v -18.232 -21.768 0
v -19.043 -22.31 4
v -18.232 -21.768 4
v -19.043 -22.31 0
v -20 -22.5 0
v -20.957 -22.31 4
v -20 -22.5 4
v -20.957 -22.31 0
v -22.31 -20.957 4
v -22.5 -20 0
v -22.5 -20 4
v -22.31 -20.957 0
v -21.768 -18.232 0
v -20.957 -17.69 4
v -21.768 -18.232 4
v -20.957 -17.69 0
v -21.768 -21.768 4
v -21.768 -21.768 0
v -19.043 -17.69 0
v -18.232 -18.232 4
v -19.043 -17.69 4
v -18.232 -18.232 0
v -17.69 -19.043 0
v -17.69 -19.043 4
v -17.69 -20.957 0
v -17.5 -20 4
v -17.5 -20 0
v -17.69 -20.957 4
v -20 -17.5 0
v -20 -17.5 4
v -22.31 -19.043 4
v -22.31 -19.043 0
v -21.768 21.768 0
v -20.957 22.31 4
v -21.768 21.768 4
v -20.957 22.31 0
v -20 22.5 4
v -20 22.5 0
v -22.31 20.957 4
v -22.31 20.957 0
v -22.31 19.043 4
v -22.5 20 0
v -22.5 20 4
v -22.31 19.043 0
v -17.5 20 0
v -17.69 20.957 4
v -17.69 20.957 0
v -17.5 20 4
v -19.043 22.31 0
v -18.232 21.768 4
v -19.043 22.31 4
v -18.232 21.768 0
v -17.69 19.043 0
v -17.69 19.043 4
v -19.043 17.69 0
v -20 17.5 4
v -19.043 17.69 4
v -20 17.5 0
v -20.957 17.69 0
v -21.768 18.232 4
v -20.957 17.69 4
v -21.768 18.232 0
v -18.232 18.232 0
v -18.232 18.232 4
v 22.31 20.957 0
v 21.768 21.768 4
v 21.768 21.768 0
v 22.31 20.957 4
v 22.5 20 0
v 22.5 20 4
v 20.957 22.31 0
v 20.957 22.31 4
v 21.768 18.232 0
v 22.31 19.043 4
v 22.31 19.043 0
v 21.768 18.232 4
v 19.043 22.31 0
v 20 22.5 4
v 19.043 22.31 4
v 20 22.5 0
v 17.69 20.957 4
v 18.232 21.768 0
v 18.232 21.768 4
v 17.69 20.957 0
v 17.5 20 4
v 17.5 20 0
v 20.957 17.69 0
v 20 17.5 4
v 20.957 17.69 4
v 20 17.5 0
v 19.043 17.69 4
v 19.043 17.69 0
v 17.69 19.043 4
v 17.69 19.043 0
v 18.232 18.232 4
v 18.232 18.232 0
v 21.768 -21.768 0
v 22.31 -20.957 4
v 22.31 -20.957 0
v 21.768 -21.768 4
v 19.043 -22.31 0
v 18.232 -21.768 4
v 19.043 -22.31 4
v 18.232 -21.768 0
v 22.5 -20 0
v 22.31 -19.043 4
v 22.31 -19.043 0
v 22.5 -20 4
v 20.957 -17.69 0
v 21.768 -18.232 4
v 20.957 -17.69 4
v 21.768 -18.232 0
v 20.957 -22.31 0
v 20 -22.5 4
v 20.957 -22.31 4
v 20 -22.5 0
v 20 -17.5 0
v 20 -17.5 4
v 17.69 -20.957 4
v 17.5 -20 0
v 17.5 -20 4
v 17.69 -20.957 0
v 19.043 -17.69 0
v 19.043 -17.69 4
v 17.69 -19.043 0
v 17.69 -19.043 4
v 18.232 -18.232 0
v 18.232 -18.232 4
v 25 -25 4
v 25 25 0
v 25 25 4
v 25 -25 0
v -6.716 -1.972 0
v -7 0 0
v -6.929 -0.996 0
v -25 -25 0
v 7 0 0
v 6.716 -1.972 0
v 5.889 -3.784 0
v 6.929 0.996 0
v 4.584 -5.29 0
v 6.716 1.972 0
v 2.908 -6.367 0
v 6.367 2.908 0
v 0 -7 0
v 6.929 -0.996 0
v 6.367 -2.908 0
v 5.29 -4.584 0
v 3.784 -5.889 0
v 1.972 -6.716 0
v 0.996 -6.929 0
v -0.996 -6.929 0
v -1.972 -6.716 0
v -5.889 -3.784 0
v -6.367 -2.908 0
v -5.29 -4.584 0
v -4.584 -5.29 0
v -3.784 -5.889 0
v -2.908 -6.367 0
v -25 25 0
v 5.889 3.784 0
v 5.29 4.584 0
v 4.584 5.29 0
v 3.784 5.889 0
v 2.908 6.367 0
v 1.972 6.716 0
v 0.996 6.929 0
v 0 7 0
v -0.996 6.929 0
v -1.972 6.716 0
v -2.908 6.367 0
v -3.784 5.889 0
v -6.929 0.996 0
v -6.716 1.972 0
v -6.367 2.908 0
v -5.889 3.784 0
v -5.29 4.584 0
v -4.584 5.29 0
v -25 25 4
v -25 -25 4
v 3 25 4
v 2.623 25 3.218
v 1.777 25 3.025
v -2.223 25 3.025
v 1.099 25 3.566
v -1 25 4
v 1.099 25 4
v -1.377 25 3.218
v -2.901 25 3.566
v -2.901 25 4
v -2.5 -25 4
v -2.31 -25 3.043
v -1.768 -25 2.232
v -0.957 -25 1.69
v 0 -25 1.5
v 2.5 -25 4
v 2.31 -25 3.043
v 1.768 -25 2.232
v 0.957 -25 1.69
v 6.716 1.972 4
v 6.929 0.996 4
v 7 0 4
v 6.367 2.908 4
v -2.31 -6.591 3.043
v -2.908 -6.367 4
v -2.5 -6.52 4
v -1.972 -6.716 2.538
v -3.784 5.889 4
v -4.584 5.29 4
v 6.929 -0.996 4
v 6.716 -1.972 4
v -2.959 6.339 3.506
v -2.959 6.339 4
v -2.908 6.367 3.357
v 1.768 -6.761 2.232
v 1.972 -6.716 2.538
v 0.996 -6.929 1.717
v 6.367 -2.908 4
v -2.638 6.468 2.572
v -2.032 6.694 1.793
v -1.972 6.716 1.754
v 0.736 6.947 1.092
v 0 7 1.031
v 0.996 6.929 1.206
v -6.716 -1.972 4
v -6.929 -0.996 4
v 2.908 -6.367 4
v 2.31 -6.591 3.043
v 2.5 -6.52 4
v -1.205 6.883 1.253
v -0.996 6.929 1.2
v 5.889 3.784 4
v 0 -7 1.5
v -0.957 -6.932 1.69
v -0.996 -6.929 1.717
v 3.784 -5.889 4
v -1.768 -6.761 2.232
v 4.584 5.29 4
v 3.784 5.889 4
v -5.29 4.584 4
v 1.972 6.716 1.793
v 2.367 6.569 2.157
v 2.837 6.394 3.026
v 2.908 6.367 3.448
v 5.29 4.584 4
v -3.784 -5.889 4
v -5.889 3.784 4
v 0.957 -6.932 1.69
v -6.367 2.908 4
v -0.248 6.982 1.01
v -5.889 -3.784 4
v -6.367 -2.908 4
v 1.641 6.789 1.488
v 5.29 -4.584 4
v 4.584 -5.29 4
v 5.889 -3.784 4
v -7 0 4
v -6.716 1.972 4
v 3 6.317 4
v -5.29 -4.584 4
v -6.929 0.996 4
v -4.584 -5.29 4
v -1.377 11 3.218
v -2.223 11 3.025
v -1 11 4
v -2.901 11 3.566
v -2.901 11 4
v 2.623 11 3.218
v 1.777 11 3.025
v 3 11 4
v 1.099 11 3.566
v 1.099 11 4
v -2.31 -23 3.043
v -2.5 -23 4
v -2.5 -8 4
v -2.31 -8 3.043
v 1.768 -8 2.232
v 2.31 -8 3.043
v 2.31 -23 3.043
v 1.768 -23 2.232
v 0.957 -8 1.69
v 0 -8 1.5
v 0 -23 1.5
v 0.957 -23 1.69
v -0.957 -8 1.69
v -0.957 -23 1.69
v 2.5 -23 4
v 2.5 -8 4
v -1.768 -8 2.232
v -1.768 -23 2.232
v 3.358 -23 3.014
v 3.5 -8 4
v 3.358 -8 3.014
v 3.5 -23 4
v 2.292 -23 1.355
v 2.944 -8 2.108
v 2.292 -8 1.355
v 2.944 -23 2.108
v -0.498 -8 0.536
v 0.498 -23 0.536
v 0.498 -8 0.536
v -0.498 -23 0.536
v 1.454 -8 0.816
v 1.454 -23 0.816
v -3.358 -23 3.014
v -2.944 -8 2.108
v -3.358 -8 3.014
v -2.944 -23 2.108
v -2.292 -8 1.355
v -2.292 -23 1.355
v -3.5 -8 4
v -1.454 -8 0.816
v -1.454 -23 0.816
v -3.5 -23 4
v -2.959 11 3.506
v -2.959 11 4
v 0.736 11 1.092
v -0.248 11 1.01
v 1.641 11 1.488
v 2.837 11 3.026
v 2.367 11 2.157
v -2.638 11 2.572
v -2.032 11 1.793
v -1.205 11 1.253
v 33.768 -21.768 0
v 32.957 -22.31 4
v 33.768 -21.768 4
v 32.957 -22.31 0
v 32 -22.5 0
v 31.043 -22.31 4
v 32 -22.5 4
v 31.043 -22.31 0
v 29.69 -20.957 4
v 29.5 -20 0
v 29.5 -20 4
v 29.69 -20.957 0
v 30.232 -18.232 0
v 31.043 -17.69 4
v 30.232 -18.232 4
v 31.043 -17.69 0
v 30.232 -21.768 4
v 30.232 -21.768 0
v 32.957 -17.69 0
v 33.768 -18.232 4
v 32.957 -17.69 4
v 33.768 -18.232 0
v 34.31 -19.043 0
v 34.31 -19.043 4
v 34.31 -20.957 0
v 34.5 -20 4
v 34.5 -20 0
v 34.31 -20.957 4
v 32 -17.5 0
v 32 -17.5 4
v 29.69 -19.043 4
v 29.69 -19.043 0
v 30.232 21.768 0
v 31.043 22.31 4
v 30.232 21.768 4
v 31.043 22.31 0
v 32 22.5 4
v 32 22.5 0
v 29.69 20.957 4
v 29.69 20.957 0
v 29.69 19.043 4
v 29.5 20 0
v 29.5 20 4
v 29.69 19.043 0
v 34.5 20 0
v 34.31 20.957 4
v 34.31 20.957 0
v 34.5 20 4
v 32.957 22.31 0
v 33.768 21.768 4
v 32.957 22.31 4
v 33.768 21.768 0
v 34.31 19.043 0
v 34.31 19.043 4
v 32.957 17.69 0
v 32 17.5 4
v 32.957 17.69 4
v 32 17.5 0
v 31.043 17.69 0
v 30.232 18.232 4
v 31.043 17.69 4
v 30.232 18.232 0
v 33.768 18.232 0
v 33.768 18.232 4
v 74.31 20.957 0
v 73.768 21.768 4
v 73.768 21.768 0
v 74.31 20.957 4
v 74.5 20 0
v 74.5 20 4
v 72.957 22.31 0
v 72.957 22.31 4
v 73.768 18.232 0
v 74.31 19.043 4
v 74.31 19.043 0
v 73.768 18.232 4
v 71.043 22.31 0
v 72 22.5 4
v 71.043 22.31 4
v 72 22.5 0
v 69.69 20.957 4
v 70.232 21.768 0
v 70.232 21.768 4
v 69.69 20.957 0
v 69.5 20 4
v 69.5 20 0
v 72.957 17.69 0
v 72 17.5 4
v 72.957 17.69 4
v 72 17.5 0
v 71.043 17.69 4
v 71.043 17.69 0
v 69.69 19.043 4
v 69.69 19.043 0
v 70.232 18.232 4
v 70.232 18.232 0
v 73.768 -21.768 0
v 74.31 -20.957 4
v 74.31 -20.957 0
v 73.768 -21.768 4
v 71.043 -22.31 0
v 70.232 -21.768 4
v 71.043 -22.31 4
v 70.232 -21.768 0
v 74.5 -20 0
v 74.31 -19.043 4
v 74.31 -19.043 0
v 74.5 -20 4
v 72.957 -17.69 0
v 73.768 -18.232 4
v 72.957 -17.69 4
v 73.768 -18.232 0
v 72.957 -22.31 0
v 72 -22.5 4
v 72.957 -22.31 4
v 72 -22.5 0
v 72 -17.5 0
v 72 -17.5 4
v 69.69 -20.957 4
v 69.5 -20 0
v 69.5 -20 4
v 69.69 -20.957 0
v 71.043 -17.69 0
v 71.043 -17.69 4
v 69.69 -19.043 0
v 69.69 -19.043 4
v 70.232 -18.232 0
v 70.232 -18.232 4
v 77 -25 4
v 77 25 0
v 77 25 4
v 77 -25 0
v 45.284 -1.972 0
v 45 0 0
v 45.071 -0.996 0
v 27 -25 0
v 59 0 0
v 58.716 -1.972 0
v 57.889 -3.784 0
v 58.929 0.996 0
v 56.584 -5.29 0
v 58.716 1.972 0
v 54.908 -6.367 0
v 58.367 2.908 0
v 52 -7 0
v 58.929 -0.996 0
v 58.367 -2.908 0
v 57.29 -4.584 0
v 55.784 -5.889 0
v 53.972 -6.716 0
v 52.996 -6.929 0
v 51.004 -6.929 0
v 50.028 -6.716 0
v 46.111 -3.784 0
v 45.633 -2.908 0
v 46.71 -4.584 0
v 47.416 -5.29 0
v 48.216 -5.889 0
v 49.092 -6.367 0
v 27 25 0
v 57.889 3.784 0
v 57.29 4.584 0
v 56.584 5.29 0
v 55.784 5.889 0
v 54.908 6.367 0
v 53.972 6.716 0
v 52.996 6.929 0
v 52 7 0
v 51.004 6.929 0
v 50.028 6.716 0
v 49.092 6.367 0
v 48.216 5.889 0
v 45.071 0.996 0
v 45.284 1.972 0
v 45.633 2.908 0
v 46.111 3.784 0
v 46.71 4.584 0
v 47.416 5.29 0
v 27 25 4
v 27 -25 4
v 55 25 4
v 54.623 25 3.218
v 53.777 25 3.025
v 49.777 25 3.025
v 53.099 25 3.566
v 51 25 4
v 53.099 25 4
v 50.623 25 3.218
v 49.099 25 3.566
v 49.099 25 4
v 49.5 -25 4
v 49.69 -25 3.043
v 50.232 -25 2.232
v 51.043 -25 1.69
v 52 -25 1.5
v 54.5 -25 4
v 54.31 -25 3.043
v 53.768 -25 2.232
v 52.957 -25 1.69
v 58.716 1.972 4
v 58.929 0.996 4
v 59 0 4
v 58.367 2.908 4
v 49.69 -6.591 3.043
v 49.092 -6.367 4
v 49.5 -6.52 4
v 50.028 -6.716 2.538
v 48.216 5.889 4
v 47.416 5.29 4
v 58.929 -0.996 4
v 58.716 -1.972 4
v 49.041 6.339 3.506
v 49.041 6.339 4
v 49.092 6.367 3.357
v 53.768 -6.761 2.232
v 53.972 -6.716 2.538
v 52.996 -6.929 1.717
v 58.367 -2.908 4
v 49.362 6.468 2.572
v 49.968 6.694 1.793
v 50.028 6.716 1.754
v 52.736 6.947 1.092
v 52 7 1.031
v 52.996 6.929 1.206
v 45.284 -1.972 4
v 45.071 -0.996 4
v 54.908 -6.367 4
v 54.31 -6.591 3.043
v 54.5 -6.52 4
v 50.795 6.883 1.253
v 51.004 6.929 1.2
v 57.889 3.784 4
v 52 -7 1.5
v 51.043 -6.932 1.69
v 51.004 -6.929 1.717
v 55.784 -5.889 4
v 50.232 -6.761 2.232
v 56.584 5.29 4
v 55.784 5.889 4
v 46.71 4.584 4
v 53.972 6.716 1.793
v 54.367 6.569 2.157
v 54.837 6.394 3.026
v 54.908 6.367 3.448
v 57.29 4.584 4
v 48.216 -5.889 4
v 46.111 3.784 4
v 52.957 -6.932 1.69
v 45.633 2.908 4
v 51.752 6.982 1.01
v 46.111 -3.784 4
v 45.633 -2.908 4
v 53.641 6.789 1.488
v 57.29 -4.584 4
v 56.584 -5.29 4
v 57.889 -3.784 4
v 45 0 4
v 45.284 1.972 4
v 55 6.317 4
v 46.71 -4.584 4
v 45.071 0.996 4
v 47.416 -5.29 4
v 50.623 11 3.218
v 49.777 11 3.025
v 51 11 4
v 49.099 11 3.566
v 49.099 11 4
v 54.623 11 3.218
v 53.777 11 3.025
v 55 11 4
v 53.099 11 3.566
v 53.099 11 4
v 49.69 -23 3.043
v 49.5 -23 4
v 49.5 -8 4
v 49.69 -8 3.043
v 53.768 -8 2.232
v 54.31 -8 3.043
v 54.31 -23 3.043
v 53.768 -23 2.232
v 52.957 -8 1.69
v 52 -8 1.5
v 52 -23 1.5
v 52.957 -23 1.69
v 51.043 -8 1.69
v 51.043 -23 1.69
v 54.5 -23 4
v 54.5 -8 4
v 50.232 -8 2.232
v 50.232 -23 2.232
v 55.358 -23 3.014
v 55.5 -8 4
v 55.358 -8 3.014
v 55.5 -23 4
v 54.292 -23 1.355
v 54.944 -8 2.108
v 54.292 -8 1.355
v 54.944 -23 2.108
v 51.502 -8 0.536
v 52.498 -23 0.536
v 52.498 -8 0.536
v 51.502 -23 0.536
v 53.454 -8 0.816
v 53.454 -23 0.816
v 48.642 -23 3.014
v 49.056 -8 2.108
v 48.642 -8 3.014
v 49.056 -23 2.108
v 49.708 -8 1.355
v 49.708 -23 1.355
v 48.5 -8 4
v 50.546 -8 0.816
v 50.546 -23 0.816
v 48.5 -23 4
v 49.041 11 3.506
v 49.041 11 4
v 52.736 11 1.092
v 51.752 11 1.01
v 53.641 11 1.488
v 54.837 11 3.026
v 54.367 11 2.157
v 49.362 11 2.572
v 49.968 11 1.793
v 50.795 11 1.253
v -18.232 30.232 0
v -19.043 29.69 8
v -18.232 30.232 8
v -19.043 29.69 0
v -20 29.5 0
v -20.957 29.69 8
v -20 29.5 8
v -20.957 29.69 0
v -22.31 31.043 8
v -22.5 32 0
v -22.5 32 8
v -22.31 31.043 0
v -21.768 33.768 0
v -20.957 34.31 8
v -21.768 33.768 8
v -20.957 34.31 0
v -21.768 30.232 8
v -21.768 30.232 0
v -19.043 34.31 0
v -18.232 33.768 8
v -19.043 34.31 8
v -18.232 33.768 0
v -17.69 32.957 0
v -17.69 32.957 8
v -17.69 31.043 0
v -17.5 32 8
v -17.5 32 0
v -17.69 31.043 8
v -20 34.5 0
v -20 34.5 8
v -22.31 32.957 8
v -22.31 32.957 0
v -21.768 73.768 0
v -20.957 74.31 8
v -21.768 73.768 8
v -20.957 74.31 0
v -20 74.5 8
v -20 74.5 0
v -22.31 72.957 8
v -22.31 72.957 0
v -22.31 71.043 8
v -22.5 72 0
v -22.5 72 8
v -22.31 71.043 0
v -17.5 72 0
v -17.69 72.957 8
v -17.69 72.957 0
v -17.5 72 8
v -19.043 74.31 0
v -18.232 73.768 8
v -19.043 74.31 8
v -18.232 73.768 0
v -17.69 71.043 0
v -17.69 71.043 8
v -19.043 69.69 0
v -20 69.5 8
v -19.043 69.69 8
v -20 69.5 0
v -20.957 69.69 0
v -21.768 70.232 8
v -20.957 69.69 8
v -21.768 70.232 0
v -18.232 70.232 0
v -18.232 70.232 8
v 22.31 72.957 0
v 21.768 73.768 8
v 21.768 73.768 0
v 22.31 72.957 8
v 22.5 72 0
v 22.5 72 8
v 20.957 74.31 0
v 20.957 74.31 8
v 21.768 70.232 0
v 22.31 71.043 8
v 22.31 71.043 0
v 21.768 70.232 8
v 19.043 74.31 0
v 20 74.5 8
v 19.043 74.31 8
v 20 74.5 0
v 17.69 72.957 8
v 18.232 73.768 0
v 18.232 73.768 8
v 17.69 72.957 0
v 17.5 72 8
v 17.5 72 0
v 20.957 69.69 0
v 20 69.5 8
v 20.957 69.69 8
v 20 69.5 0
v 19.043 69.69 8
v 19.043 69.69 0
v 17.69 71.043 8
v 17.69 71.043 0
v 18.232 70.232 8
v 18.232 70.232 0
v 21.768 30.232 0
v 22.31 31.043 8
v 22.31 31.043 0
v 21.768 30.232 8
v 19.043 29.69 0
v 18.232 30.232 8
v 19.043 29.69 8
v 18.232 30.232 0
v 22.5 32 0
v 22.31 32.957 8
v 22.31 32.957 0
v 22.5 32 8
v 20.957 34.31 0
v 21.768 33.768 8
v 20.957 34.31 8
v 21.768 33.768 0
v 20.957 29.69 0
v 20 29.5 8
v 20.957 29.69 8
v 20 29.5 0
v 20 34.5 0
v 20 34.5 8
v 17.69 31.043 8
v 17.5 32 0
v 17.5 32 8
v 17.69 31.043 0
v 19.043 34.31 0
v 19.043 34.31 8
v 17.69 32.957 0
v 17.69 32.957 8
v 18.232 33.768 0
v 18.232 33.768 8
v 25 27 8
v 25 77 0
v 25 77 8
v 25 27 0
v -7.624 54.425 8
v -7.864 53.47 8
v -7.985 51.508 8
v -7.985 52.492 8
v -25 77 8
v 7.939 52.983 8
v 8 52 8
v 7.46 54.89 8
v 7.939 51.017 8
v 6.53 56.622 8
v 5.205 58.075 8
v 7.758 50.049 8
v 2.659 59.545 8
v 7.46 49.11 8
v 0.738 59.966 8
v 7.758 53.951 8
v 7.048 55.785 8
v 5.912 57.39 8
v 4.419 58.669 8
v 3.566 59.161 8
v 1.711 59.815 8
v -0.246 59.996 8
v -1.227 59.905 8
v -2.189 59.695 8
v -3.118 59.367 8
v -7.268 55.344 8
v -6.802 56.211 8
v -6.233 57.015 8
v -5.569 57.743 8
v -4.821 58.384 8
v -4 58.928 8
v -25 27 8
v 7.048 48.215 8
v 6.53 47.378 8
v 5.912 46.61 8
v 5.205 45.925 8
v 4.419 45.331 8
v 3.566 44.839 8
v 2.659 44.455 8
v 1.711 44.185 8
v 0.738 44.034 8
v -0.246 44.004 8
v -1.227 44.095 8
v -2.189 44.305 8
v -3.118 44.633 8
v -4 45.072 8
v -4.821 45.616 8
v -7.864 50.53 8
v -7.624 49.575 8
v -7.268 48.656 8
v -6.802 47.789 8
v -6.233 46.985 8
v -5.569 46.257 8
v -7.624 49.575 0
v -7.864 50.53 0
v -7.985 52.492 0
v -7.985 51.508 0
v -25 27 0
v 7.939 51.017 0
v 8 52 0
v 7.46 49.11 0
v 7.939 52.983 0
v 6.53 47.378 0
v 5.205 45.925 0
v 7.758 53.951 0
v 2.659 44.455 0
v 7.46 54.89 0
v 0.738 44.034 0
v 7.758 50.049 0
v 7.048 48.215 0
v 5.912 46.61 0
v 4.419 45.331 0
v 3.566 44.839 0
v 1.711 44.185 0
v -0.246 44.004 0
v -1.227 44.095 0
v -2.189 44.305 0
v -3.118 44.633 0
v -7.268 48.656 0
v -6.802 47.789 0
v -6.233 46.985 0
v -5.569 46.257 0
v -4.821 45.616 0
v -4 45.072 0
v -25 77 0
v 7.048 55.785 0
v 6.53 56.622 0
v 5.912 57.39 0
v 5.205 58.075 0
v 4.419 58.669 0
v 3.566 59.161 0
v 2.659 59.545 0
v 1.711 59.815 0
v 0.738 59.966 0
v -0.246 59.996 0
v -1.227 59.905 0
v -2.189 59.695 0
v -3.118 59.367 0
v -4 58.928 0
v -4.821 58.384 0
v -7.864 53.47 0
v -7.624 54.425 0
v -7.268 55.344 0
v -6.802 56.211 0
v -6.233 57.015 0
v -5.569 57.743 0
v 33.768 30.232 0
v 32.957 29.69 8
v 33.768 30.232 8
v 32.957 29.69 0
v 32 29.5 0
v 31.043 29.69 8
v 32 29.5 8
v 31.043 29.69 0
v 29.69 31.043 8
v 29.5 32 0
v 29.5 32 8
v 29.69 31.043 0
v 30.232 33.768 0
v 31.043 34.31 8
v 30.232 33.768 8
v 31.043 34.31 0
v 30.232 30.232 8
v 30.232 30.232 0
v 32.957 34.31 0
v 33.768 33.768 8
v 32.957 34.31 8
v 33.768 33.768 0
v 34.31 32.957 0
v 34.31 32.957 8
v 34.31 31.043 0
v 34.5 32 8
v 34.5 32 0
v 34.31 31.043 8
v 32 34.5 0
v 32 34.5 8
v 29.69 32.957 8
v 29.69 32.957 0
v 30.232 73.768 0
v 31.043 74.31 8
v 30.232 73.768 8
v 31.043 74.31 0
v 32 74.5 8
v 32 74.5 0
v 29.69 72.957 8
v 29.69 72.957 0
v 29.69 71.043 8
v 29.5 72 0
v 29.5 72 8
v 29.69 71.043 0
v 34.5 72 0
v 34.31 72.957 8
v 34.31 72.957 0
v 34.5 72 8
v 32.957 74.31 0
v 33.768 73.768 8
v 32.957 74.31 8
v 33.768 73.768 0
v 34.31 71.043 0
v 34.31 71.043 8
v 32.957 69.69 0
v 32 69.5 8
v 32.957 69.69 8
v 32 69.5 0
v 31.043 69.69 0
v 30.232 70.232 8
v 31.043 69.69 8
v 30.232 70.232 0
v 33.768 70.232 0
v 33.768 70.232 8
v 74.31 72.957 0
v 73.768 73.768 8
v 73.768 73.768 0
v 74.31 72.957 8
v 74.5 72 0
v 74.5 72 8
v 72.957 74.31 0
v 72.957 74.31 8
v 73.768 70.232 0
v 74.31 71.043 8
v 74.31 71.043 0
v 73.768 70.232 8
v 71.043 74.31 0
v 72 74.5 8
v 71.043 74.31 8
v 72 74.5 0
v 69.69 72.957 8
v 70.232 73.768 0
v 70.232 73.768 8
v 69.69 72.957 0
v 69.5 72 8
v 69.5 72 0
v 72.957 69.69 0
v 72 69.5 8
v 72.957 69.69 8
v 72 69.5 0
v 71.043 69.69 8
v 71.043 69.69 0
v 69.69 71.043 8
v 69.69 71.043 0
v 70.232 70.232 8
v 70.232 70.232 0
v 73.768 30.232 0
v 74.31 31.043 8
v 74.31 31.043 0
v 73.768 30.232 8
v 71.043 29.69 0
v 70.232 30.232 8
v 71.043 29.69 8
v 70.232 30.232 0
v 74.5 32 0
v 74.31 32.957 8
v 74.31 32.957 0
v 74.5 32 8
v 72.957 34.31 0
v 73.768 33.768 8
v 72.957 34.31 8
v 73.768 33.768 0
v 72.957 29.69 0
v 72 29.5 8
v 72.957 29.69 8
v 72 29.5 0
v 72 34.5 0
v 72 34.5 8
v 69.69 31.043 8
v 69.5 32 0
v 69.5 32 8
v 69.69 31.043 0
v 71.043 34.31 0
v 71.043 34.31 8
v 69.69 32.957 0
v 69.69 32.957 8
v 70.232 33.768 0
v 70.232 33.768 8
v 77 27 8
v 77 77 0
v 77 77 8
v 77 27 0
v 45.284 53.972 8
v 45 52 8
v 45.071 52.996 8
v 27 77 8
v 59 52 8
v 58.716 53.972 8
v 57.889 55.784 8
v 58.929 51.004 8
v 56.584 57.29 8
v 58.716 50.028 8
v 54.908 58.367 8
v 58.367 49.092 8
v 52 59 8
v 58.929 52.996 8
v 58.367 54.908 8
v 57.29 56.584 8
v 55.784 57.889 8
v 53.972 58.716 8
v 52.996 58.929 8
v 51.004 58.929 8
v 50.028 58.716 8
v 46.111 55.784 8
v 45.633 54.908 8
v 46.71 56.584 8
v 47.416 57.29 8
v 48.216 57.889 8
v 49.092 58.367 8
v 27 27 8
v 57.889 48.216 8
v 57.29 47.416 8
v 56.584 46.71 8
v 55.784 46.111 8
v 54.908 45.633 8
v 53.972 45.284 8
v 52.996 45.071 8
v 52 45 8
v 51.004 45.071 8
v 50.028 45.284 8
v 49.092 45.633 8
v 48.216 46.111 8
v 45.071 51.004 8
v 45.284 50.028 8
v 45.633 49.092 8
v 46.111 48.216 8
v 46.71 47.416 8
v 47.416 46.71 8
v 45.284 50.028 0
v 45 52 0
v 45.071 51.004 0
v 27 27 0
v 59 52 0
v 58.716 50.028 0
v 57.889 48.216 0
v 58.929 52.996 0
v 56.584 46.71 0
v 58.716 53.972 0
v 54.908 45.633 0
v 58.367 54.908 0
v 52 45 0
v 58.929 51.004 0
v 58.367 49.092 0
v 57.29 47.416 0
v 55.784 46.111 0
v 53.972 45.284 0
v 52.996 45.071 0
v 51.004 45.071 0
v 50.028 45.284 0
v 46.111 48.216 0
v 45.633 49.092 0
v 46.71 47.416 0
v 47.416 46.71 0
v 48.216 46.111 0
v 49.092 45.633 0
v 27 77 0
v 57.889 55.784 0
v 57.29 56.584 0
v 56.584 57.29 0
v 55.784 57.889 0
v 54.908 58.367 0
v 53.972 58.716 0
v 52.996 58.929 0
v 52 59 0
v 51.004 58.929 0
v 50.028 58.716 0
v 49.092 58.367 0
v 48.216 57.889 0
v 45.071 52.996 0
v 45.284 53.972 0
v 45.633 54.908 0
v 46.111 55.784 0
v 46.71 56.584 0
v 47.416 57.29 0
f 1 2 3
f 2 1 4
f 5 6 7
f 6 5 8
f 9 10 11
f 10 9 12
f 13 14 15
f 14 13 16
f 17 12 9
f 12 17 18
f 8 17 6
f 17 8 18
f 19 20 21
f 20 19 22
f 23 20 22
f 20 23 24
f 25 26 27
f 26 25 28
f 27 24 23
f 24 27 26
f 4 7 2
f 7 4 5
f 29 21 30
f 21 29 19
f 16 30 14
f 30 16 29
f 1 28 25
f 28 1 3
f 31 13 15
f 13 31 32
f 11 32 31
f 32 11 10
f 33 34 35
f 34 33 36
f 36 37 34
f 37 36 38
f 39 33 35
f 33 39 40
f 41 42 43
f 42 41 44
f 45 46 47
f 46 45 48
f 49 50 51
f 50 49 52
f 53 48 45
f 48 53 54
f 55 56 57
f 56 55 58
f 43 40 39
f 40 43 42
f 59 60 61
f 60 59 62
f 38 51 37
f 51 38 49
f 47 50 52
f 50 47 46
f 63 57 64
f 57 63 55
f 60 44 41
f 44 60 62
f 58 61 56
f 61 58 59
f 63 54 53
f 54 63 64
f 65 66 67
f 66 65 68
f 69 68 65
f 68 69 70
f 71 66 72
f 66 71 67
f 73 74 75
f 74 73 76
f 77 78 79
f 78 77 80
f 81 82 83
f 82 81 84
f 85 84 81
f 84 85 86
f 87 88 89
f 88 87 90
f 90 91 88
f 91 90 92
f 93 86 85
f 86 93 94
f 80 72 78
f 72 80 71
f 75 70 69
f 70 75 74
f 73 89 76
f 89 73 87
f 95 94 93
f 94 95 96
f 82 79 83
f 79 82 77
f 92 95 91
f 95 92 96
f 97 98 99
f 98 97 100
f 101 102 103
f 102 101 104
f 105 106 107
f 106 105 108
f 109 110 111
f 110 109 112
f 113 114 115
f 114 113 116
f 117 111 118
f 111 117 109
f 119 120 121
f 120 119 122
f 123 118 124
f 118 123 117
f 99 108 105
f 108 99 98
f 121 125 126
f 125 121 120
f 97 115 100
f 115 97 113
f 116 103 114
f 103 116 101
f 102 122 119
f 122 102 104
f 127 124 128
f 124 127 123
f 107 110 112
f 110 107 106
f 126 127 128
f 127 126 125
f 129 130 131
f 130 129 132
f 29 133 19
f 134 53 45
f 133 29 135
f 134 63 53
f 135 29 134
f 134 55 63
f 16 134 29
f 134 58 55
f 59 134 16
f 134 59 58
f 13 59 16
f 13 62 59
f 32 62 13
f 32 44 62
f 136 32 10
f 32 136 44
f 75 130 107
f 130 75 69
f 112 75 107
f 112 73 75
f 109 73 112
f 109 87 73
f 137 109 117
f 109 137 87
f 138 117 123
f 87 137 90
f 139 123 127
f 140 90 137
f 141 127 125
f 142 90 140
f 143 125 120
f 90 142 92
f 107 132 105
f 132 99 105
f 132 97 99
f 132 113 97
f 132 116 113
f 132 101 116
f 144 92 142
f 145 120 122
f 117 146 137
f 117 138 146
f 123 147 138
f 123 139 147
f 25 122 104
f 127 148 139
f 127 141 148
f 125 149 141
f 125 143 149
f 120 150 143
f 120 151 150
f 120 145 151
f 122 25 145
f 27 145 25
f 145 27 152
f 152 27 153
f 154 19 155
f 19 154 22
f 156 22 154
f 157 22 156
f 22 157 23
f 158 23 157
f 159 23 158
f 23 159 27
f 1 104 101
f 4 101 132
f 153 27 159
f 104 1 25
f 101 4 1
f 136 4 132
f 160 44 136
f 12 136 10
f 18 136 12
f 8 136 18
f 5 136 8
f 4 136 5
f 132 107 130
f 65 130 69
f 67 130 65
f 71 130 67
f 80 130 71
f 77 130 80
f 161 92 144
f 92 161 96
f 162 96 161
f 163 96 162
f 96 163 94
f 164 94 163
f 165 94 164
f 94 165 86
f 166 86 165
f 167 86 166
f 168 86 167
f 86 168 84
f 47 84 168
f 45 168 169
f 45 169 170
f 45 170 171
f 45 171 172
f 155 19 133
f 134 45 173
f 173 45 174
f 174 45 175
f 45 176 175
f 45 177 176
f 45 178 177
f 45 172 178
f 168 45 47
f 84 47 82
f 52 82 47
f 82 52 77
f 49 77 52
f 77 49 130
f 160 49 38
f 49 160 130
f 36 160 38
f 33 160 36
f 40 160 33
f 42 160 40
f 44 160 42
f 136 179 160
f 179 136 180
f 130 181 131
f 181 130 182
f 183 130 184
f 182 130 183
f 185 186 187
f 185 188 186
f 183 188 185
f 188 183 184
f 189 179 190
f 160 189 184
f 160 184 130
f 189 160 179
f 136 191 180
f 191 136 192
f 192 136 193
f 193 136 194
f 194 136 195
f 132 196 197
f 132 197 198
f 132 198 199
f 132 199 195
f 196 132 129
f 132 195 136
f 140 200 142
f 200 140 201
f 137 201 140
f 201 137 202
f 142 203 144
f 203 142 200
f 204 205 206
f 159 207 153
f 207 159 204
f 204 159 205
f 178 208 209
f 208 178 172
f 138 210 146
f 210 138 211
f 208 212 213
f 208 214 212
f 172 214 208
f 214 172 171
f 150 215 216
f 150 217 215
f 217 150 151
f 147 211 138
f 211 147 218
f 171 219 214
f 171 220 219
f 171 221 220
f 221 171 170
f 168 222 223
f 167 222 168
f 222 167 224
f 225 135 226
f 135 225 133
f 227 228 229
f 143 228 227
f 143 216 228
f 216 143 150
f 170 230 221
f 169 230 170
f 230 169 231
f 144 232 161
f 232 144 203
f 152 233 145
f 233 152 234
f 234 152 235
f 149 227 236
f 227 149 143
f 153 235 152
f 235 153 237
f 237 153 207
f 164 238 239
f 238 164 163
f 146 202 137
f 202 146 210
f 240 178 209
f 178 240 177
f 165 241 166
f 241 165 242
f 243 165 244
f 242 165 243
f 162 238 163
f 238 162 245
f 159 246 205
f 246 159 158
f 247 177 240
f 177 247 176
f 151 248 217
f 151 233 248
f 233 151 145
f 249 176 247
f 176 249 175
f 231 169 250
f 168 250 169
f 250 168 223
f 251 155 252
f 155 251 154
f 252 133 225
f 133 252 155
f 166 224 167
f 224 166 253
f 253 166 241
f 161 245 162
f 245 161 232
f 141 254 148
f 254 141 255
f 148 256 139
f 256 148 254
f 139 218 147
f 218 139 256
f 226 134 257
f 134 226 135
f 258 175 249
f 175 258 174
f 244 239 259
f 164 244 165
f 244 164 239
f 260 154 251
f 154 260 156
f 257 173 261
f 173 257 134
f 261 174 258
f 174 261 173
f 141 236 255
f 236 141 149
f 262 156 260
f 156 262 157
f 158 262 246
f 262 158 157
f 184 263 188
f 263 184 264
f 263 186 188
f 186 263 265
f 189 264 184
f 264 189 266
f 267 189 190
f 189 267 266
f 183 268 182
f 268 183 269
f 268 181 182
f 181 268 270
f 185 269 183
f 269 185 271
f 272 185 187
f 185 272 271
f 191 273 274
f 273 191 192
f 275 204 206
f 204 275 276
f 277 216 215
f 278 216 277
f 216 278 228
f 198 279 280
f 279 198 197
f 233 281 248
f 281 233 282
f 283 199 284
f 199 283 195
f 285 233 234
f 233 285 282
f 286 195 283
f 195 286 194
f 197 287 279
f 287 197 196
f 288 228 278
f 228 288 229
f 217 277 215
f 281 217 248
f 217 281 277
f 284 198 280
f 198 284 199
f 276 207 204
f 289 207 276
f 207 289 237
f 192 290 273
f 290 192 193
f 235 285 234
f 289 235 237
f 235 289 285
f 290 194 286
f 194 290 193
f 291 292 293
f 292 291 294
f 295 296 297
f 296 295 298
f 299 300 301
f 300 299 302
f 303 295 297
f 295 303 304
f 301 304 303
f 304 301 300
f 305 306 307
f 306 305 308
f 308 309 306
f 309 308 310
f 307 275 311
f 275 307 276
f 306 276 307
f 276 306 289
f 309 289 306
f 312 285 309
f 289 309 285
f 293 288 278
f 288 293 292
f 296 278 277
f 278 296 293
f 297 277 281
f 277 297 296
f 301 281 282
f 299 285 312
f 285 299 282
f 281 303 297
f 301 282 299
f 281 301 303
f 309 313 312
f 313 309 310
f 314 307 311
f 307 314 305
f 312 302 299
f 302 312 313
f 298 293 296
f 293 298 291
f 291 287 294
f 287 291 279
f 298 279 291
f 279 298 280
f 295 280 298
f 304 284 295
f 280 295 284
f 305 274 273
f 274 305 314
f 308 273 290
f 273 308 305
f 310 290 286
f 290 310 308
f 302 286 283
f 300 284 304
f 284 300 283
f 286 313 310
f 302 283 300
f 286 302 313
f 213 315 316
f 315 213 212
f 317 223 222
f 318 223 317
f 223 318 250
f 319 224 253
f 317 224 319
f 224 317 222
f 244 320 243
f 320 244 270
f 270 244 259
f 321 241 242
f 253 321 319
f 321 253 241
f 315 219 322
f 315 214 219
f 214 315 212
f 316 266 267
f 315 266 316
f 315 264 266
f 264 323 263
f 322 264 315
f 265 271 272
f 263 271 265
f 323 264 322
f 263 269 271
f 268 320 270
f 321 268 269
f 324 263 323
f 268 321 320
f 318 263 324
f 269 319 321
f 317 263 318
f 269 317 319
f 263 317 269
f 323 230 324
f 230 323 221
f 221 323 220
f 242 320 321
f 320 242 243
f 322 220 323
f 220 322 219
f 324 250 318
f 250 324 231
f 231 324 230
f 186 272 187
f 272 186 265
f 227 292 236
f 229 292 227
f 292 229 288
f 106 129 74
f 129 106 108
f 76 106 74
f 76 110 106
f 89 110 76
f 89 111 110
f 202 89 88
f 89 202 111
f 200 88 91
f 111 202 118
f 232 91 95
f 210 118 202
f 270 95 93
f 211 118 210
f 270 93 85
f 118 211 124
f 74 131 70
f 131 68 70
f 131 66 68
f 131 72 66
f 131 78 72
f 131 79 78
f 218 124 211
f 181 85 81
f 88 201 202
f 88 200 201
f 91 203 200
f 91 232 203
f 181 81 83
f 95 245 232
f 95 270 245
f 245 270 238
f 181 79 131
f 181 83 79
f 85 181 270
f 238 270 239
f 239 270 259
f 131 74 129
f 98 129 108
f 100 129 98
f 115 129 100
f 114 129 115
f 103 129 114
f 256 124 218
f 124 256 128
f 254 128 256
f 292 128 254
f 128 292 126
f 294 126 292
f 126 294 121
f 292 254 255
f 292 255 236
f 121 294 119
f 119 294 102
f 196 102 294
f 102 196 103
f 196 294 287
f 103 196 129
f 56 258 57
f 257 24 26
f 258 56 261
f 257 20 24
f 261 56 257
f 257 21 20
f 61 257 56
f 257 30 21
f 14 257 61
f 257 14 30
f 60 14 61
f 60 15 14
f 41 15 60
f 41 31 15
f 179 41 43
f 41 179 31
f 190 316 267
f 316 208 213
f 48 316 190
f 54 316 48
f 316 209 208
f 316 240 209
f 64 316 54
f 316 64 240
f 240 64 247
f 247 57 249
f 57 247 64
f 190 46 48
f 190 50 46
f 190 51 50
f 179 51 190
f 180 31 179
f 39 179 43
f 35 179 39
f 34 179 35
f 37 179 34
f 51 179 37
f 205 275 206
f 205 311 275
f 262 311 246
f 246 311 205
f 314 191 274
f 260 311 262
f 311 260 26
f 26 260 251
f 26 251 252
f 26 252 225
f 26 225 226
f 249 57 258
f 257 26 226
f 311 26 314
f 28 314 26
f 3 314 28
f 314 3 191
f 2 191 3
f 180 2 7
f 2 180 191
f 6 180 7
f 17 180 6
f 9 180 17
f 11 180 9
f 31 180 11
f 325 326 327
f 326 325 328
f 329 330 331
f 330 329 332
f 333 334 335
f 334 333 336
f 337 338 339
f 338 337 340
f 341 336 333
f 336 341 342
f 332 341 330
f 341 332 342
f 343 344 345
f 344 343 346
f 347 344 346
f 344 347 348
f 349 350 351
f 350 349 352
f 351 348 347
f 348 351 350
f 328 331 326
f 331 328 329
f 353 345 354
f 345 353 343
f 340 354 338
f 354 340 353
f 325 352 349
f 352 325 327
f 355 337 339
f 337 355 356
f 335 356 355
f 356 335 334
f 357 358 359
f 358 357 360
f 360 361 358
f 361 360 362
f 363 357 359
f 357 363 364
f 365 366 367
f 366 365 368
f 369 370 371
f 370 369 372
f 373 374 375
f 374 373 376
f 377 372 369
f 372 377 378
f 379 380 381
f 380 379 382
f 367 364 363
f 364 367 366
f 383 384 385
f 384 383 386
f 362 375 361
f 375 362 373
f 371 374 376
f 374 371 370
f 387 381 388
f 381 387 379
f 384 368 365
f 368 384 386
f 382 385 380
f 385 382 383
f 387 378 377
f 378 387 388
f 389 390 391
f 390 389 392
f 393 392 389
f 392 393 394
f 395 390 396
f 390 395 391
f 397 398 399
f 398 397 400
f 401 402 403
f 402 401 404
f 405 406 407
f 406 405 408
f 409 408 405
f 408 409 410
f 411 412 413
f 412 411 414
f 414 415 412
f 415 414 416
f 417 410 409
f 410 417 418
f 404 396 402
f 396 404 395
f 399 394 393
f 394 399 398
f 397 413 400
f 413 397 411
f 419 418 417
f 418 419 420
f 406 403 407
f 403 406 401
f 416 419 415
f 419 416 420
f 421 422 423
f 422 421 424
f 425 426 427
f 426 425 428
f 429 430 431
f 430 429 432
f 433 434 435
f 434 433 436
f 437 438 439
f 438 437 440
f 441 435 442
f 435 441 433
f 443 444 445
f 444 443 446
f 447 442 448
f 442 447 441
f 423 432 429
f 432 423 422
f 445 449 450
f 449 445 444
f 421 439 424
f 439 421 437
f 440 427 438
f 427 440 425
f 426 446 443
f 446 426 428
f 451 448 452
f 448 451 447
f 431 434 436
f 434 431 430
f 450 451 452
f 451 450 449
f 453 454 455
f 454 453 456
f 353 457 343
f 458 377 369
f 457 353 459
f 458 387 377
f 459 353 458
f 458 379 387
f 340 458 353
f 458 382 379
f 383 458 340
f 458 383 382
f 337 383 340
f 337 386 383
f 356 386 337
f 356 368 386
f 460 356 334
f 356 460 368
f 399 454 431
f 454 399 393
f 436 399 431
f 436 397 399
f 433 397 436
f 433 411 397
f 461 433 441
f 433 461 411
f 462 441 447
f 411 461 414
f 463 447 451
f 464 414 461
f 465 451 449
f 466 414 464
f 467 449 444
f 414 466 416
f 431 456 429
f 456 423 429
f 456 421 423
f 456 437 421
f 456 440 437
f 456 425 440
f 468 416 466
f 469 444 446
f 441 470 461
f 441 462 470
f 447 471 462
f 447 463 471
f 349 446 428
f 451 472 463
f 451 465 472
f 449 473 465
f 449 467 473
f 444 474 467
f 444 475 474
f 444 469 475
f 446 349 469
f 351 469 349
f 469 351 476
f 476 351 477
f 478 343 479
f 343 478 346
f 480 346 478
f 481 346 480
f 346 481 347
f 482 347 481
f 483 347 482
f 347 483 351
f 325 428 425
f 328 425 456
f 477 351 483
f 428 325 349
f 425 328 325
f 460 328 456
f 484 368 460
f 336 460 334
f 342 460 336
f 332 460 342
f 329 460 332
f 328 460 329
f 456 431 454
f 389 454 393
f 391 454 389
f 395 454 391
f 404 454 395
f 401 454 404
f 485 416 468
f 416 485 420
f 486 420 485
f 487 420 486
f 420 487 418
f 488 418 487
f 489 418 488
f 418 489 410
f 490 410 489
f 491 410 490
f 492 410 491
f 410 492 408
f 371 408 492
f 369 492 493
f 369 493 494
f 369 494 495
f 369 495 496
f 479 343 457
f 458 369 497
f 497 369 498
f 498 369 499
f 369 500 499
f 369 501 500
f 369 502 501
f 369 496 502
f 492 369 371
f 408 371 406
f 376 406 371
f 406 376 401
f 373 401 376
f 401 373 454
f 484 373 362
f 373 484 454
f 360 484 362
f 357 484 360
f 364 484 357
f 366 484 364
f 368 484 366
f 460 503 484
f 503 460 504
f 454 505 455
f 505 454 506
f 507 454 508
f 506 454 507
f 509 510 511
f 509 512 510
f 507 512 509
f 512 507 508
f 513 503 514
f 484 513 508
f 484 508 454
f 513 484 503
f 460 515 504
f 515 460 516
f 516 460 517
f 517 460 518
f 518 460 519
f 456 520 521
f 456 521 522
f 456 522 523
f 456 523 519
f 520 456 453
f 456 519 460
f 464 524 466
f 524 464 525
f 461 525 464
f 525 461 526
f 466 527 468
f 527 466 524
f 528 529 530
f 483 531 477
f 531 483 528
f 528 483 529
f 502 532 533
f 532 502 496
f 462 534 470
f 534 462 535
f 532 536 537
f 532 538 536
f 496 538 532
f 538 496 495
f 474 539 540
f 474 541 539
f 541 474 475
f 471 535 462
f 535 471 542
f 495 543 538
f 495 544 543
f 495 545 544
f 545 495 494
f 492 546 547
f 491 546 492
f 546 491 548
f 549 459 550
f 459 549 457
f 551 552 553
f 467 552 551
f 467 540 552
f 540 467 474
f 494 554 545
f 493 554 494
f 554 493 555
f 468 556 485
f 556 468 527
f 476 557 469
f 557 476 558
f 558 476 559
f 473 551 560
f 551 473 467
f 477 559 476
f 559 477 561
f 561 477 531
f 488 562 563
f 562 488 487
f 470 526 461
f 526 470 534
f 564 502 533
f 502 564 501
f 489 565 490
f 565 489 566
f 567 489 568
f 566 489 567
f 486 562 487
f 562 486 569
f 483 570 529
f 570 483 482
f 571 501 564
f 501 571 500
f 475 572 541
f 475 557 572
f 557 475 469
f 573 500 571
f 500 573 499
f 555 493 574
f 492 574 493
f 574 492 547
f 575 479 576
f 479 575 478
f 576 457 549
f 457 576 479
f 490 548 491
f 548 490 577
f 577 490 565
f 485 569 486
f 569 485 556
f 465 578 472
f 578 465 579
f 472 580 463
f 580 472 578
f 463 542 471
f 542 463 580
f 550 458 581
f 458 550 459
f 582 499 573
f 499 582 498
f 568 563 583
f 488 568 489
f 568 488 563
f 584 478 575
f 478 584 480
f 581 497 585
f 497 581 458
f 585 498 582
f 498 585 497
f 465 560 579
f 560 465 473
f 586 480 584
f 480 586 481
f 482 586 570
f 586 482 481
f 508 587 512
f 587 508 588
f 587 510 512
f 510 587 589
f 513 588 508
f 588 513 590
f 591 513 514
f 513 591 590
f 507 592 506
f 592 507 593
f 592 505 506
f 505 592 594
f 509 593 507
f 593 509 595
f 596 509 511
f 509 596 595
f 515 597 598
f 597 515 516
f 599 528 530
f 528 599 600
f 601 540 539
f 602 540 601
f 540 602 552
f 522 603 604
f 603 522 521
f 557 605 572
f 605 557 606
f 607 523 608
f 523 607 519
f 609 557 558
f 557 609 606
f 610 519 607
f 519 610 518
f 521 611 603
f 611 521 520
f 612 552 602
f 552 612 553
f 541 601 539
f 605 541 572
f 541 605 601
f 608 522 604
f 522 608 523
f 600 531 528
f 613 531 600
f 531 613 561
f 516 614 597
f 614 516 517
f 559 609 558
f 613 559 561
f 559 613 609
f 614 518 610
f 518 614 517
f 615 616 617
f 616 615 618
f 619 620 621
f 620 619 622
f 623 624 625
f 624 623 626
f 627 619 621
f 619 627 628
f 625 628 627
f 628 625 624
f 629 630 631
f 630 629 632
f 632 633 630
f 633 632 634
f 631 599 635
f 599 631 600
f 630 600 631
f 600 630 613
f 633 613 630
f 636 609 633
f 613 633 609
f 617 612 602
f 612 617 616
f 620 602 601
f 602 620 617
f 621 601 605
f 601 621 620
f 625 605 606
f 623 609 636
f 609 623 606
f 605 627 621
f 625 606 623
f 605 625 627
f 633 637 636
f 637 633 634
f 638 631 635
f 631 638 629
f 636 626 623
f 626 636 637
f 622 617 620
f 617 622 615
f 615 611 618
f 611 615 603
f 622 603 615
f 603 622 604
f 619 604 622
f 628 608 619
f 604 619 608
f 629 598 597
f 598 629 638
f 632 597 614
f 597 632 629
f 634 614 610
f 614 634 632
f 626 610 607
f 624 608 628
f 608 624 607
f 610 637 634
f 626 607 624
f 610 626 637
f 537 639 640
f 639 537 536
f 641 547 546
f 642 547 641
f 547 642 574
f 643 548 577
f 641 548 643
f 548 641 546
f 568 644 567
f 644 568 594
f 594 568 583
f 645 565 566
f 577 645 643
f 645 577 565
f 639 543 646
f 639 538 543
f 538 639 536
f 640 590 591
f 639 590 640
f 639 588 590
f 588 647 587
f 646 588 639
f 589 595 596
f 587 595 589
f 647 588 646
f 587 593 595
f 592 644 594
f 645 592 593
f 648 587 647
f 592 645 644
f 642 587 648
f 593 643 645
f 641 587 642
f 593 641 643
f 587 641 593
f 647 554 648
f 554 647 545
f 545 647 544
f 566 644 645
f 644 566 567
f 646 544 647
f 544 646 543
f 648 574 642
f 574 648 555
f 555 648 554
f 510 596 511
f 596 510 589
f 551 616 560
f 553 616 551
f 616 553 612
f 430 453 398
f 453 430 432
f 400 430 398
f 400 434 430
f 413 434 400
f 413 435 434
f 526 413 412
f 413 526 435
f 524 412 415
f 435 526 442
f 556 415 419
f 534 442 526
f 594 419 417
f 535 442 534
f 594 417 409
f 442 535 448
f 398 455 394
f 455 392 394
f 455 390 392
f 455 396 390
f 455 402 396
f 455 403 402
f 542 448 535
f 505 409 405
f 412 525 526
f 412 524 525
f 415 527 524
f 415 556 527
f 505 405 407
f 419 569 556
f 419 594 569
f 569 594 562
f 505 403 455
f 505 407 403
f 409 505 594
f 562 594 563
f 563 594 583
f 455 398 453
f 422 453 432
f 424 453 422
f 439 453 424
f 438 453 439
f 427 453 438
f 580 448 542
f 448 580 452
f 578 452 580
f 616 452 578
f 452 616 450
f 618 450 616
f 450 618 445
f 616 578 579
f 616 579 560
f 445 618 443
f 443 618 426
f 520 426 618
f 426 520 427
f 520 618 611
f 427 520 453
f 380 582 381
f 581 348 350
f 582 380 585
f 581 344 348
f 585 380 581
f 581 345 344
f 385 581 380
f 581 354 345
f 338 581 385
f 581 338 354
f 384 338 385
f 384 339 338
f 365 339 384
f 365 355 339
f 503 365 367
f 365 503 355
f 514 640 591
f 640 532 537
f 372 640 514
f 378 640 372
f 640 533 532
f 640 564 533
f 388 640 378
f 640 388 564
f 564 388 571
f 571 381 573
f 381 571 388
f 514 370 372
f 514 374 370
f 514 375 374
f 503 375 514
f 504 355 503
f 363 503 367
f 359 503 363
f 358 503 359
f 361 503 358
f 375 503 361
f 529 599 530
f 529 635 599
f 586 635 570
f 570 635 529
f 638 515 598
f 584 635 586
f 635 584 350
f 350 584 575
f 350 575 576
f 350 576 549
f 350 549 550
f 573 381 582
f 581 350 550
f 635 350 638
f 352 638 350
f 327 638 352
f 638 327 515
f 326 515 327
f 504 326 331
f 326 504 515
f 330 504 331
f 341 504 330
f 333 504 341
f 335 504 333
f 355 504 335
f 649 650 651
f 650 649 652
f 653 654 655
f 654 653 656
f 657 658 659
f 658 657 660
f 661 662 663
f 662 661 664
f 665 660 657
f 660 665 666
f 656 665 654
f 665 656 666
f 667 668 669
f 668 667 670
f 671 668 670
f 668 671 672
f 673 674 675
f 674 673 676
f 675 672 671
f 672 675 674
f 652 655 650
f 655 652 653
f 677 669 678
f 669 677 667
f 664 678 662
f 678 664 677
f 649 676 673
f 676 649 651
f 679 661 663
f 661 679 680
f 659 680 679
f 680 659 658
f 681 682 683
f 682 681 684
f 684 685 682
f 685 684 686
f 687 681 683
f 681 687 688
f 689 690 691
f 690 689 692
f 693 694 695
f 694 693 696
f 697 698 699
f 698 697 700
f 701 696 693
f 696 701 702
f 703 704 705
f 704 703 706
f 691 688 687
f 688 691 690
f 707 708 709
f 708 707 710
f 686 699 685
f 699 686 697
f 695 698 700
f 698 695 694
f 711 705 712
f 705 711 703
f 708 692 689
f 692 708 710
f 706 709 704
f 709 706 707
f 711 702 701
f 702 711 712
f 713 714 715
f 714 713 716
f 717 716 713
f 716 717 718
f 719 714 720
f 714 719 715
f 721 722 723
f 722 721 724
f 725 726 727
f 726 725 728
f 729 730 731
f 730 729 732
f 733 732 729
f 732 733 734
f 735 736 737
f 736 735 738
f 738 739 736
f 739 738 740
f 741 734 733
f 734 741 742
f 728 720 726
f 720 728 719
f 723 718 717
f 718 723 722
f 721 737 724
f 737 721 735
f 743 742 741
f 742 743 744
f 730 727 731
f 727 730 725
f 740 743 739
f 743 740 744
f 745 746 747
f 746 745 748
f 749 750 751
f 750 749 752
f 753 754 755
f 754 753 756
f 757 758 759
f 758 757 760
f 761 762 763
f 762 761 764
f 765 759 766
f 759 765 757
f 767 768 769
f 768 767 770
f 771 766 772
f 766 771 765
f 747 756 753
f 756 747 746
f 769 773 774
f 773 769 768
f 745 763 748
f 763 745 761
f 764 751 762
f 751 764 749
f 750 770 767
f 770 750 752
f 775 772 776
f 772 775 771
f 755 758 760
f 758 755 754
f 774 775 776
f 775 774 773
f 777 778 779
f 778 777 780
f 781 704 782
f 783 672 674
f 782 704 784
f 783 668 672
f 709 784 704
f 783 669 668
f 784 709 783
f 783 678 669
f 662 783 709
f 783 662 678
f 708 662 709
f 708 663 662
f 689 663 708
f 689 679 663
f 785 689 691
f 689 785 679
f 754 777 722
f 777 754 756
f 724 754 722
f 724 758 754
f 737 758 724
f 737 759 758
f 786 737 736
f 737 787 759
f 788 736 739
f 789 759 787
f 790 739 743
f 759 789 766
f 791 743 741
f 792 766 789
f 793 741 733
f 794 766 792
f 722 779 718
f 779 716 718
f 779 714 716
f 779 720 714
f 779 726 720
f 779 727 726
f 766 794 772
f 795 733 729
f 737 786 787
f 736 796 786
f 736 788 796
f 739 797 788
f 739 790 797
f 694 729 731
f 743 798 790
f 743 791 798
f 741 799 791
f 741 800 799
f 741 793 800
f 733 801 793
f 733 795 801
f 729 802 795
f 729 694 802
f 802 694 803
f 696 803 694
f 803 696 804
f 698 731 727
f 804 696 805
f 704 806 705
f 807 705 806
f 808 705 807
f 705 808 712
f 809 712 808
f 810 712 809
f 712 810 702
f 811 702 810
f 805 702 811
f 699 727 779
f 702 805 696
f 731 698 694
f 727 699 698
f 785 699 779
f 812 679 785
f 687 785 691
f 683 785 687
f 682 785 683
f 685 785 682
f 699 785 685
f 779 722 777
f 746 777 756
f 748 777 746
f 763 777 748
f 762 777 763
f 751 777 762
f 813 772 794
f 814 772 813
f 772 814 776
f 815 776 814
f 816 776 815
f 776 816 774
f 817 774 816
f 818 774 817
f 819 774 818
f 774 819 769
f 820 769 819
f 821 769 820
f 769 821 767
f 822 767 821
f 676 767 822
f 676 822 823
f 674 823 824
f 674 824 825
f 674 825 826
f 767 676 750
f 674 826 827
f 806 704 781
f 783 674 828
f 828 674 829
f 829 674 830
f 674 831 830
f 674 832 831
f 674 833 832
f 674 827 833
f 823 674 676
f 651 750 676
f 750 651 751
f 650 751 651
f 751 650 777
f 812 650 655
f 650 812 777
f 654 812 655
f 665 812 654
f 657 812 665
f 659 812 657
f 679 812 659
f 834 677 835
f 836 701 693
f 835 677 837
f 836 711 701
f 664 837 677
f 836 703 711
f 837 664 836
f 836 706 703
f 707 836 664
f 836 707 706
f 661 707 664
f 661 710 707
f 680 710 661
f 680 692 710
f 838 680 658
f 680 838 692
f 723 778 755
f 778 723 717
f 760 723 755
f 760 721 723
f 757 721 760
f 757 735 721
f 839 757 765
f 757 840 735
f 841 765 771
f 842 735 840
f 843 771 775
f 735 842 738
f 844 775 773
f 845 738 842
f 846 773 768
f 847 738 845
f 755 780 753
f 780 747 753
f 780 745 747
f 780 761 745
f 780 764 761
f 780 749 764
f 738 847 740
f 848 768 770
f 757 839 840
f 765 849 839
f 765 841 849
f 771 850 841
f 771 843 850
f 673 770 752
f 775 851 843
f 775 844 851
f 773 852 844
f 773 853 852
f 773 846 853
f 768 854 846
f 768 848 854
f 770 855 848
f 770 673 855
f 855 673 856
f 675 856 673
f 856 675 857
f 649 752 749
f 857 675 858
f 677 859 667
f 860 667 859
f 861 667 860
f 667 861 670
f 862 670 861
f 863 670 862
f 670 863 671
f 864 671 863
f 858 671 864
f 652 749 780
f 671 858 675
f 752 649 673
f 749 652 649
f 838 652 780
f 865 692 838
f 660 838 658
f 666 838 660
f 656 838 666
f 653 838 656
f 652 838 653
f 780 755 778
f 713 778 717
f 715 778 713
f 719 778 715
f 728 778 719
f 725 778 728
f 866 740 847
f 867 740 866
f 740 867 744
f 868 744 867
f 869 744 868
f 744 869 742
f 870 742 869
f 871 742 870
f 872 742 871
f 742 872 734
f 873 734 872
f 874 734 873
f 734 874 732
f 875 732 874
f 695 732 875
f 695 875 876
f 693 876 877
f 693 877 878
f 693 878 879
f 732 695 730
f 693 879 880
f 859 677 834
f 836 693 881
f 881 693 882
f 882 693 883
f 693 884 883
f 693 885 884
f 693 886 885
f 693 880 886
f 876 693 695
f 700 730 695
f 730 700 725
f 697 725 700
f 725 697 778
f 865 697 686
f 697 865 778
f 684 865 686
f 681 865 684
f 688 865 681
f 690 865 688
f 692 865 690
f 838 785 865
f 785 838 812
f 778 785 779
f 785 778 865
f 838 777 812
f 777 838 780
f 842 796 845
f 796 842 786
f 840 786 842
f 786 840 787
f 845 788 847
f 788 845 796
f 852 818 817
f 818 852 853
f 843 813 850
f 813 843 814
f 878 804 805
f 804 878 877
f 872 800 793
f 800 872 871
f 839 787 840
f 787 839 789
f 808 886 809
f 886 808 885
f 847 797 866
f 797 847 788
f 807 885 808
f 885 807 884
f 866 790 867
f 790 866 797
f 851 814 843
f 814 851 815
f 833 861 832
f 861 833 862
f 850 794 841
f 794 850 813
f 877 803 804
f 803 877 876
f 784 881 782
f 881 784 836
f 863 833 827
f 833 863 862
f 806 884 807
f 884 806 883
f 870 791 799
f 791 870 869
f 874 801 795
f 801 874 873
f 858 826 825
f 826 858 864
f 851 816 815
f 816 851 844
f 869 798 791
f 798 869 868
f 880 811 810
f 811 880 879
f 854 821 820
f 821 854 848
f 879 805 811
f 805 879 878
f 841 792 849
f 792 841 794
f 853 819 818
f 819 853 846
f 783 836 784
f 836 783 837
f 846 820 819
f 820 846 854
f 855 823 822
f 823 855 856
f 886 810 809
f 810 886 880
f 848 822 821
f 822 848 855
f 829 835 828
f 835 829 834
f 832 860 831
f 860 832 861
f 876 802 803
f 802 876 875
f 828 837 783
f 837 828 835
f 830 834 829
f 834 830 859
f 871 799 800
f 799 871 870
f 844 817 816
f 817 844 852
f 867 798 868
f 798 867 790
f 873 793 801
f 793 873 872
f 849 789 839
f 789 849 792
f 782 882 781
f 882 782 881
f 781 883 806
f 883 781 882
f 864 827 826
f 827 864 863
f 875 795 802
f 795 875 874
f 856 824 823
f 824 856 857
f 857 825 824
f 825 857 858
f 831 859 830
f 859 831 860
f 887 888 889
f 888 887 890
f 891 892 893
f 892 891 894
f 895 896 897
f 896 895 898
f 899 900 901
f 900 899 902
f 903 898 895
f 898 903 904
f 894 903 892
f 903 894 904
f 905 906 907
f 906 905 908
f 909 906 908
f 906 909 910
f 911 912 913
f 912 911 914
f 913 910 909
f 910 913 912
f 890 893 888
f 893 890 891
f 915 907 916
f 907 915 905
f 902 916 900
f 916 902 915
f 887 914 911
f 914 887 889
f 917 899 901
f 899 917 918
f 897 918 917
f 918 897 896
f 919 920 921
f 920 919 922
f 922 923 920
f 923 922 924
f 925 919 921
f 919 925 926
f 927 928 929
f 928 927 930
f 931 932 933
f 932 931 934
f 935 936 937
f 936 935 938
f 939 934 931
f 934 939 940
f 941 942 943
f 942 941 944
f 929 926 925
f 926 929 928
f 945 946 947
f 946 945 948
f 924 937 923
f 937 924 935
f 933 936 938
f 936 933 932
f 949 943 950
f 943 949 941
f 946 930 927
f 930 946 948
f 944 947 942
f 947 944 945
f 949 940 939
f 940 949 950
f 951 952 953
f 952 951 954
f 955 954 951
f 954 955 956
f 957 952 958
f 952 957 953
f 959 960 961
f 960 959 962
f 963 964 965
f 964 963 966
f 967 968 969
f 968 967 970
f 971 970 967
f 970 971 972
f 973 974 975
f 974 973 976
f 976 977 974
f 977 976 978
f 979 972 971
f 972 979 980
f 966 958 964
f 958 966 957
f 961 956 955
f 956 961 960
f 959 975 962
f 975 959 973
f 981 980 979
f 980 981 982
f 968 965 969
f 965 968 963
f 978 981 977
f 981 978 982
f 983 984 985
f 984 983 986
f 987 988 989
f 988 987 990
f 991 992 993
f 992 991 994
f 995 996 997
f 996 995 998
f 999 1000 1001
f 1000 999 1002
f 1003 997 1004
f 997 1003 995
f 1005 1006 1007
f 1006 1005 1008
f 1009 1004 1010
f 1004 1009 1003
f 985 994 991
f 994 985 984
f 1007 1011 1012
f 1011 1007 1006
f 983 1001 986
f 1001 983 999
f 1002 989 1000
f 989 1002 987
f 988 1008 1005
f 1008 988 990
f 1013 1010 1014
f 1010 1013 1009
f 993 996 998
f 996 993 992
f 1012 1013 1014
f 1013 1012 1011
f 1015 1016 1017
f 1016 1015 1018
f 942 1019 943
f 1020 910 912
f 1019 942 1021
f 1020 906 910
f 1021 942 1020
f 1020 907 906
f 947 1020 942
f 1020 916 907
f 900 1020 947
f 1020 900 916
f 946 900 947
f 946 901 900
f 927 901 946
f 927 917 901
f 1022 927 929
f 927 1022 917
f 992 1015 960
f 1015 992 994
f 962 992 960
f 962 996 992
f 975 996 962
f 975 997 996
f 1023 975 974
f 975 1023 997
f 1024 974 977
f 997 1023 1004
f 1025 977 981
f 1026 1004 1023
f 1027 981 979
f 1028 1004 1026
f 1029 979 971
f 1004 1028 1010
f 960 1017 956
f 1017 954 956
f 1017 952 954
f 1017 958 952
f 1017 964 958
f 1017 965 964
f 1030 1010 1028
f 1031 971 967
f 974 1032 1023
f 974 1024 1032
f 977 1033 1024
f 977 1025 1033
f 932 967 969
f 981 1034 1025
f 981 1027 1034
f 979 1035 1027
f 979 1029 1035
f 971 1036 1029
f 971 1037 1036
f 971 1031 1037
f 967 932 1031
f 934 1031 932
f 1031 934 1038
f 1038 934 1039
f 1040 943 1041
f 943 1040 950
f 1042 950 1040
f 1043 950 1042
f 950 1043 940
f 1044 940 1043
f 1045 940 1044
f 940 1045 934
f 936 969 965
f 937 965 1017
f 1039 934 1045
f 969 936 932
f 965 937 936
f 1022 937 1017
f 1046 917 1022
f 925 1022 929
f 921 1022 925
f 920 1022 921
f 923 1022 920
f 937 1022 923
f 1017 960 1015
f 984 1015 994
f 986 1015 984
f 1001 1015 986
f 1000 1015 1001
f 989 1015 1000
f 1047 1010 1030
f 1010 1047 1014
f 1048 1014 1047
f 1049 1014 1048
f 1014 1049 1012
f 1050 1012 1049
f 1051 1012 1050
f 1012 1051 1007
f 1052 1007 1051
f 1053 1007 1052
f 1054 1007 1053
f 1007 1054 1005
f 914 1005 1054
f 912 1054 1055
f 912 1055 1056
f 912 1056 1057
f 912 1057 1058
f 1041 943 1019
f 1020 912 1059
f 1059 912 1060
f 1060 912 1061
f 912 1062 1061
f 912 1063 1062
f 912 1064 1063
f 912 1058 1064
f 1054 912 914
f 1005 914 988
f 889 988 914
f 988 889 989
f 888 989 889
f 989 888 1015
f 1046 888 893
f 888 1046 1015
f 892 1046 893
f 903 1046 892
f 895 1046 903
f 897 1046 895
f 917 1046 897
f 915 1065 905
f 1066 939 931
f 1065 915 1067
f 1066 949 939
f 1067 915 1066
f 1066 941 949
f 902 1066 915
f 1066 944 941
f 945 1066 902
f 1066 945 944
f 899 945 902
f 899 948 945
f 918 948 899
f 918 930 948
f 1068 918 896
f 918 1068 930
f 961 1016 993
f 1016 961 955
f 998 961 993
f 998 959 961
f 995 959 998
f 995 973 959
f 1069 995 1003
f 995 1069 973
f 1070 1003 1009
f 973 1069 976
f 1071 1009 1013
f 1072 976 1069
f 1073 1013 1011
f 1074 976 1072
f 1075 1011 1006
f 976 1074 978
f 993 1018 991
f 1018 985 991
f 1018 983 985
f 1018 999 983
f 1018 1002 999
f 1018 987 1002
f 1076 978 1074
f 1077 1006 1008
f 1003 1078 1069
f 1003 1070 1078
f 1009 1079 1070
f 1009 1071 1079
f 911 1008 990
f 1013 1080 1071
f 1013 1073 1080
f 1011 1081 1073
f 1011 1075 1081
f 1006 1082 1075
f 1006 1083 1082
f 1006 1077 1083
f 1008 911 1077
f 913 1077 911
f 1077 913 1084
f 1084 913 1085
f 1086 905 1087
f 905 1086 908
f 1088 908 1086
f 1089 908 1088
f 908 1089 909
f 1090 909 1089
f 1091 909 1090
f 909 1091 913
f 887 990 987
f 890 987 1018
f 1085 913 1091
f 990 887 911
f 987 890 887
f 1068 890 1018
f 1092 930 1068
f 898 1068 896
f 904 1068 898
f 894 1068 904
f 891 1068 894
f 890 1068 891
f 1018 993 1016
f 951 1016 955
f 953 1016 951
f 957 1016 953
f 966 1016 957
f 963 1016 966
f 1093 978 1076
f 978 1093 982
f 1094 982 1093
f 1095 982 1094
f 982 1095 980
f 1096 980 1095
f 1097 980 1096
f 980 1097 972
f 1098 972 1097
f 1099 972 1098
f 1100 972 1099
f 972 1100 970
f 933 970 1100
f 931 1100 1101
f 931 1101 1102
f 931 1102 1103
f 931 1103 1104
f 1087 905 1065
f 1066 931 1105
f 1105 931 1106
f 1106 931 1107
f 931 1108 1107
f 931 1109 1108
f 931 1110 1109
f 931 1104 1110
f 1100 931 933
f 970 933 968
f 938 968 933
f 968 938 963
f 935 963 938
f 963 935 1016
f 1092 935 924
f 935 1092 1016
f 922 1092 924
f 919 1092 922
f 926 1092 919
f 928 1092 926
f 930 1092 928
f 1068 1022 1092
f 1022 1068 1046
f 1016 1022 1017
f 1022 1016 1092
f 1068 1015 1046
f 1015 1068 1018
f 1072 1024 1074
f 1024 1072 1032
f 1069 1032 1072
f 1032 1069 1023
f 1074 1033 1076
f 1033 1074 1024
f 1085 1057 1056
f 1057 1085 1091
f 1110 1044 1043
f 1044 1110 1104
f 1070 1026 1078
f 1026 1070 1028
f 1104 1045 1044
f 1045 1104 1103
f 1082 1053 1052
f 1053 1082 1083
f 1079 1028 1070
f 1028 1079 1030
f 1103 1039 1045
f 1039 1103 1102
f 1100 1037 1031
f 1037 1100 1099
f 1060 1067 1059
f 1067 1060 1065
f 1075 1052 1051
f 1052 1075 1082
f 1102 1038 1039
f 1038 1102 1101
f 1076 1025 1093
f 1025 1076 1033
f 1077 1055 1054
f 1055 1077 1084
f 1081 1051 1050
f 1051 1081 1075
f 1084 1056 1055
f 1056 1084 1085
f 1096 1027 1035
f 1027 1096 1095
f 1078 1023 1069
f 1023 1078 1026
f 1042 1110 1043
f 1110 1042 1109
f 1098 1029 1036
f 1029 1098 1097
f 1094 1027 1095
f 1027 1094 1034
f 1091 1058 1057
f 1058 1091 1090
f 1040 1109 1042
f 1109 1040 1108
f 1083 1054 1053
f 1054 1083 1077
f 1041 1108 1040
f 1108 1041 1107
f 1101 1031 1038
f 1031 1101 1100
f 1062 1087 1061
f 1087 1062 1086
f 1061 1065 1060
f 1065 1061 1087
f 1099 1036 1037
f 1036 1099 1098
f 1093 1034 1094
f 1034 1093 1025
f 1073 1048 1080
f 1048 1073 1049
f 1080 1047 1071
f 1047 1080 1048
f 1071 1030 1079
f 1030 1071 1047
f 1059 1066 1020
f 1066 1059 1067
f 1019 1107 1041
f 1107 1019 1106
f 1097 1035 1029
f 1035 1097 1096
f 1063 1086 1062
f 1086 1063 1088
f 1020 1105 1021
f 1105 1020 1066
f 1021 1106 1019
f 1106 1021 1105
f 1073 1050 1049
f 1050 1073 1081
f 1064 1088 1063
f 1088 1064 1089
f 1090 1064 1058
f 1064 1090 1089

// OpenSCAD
$fs=$fs/2;
$fa=$fa/2;

l = 50;
d = 14;
h2 = 8;
h1 = 4;
    

module support(h, d){
    difference(){
        translate([-l/2,-l/2,0])cube([l,l,h2]);
        for(i = [180,90,0,-90]){
            rotate([0,0,i])translate([l/2-5,l/2-5,-1])cylinder(r = 2.5, h2*2);
        }
        translate([0,0,-1])  cylinder(r = d/2, h2+2);
    }
}

module optique(){
    difference(){
        support(h2, d);
        
        translate([-2,0,h1]) rotate([-90,0,0]) cylinder(r = 2/2, 60);
        translate([2,0,h1]) rotate([-90,0,0]) cylinder(r = 2/2, 60);
        
        translate([0,0,h1]) rotate([90,0,0]) cylinder(r = 5/2, 60);
        translate([0,-d/2-1,h1]) rotate([90,0,0]) cylinder(r = 7/2, 15);
        translate([0,d/2+5-1,h1]) rotate([90,0,0]) cylinder(r = 6/2, 5);
    }
    
}

module demi1(){
    difference(){
        optique();
        translate([0,0,h1]) cylinder(r=100, 100);
    }
}

mode=1;

if(mode==0){
    optique();
} else {
    demi1();
    translate([l+2,0,0]) demi1();
    translate([0,l+2,0]) support(10, d+2);
    translate([l+2,,l+2,0]) support(10, d);
}
